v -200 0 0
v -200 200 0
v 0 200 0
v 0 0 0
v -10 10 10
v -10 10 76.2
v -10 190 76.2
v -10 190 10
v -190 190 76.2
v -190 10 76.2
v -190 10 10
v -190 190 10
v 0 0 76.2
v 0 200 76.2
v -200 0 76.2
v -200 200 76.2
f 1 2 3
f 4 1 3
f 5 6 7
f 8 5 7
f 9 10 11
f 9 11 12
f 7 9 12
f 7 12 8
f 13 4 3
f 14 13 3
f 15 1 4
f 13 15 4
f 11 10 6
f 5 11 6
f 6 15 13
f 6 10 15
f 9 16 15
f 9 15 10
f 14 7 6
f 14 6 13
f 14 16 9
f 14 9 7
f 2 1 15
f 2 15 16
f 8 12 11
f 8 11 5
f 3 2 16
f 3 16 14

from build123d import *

# Parameters (mm, degrees)
SKETCH1_W           = 200
SKETCH1_H           = 200
BOSS_EXTRUDE1_DEPTH = 76.2
SKETCH2_W           = 180
SKETCH2_H           = 180
CUT_EXTRUDE2_DEPTH  = 80
SKETCH3_W           = 180
SKETCH3_H           = 180
BOSS_EXTRUDE2_DEPTH = 10


with BuildPart() as part:
    # Sketch1 → Boss-Extrude1 (new body)
    with BuildSketch(Plane.XY):
        with Locations((-100, 100)):
            Rectangle(SKETCH1_W, SKETCH1_H)
    extrude(amount=BOSS_EXTRUDE1_DEPTH)

    # Sketch2 → Cut-Extrude2 (cut)
    with BuildSketch(Plane.XY.offset(76.2)):
        with Locations((-100, 100)):
            Rectangle(SKETCH2_W, SKETCH2_H)
    extrude(amount=-CUT_EXTRUDE2_DEPTH, mode=Mode.SUBTRACT)

    # Sketch3 → Boss-Extrude2 (add)
    with BuildSketch(Plane.XY):
        with Locations((-100, 100)):
            Rectangle(SKETCH3_W, SKETCH3_H)
    extrude(amount=BOSS_EXTRUDE2_DEPTH)


solid = part.part
